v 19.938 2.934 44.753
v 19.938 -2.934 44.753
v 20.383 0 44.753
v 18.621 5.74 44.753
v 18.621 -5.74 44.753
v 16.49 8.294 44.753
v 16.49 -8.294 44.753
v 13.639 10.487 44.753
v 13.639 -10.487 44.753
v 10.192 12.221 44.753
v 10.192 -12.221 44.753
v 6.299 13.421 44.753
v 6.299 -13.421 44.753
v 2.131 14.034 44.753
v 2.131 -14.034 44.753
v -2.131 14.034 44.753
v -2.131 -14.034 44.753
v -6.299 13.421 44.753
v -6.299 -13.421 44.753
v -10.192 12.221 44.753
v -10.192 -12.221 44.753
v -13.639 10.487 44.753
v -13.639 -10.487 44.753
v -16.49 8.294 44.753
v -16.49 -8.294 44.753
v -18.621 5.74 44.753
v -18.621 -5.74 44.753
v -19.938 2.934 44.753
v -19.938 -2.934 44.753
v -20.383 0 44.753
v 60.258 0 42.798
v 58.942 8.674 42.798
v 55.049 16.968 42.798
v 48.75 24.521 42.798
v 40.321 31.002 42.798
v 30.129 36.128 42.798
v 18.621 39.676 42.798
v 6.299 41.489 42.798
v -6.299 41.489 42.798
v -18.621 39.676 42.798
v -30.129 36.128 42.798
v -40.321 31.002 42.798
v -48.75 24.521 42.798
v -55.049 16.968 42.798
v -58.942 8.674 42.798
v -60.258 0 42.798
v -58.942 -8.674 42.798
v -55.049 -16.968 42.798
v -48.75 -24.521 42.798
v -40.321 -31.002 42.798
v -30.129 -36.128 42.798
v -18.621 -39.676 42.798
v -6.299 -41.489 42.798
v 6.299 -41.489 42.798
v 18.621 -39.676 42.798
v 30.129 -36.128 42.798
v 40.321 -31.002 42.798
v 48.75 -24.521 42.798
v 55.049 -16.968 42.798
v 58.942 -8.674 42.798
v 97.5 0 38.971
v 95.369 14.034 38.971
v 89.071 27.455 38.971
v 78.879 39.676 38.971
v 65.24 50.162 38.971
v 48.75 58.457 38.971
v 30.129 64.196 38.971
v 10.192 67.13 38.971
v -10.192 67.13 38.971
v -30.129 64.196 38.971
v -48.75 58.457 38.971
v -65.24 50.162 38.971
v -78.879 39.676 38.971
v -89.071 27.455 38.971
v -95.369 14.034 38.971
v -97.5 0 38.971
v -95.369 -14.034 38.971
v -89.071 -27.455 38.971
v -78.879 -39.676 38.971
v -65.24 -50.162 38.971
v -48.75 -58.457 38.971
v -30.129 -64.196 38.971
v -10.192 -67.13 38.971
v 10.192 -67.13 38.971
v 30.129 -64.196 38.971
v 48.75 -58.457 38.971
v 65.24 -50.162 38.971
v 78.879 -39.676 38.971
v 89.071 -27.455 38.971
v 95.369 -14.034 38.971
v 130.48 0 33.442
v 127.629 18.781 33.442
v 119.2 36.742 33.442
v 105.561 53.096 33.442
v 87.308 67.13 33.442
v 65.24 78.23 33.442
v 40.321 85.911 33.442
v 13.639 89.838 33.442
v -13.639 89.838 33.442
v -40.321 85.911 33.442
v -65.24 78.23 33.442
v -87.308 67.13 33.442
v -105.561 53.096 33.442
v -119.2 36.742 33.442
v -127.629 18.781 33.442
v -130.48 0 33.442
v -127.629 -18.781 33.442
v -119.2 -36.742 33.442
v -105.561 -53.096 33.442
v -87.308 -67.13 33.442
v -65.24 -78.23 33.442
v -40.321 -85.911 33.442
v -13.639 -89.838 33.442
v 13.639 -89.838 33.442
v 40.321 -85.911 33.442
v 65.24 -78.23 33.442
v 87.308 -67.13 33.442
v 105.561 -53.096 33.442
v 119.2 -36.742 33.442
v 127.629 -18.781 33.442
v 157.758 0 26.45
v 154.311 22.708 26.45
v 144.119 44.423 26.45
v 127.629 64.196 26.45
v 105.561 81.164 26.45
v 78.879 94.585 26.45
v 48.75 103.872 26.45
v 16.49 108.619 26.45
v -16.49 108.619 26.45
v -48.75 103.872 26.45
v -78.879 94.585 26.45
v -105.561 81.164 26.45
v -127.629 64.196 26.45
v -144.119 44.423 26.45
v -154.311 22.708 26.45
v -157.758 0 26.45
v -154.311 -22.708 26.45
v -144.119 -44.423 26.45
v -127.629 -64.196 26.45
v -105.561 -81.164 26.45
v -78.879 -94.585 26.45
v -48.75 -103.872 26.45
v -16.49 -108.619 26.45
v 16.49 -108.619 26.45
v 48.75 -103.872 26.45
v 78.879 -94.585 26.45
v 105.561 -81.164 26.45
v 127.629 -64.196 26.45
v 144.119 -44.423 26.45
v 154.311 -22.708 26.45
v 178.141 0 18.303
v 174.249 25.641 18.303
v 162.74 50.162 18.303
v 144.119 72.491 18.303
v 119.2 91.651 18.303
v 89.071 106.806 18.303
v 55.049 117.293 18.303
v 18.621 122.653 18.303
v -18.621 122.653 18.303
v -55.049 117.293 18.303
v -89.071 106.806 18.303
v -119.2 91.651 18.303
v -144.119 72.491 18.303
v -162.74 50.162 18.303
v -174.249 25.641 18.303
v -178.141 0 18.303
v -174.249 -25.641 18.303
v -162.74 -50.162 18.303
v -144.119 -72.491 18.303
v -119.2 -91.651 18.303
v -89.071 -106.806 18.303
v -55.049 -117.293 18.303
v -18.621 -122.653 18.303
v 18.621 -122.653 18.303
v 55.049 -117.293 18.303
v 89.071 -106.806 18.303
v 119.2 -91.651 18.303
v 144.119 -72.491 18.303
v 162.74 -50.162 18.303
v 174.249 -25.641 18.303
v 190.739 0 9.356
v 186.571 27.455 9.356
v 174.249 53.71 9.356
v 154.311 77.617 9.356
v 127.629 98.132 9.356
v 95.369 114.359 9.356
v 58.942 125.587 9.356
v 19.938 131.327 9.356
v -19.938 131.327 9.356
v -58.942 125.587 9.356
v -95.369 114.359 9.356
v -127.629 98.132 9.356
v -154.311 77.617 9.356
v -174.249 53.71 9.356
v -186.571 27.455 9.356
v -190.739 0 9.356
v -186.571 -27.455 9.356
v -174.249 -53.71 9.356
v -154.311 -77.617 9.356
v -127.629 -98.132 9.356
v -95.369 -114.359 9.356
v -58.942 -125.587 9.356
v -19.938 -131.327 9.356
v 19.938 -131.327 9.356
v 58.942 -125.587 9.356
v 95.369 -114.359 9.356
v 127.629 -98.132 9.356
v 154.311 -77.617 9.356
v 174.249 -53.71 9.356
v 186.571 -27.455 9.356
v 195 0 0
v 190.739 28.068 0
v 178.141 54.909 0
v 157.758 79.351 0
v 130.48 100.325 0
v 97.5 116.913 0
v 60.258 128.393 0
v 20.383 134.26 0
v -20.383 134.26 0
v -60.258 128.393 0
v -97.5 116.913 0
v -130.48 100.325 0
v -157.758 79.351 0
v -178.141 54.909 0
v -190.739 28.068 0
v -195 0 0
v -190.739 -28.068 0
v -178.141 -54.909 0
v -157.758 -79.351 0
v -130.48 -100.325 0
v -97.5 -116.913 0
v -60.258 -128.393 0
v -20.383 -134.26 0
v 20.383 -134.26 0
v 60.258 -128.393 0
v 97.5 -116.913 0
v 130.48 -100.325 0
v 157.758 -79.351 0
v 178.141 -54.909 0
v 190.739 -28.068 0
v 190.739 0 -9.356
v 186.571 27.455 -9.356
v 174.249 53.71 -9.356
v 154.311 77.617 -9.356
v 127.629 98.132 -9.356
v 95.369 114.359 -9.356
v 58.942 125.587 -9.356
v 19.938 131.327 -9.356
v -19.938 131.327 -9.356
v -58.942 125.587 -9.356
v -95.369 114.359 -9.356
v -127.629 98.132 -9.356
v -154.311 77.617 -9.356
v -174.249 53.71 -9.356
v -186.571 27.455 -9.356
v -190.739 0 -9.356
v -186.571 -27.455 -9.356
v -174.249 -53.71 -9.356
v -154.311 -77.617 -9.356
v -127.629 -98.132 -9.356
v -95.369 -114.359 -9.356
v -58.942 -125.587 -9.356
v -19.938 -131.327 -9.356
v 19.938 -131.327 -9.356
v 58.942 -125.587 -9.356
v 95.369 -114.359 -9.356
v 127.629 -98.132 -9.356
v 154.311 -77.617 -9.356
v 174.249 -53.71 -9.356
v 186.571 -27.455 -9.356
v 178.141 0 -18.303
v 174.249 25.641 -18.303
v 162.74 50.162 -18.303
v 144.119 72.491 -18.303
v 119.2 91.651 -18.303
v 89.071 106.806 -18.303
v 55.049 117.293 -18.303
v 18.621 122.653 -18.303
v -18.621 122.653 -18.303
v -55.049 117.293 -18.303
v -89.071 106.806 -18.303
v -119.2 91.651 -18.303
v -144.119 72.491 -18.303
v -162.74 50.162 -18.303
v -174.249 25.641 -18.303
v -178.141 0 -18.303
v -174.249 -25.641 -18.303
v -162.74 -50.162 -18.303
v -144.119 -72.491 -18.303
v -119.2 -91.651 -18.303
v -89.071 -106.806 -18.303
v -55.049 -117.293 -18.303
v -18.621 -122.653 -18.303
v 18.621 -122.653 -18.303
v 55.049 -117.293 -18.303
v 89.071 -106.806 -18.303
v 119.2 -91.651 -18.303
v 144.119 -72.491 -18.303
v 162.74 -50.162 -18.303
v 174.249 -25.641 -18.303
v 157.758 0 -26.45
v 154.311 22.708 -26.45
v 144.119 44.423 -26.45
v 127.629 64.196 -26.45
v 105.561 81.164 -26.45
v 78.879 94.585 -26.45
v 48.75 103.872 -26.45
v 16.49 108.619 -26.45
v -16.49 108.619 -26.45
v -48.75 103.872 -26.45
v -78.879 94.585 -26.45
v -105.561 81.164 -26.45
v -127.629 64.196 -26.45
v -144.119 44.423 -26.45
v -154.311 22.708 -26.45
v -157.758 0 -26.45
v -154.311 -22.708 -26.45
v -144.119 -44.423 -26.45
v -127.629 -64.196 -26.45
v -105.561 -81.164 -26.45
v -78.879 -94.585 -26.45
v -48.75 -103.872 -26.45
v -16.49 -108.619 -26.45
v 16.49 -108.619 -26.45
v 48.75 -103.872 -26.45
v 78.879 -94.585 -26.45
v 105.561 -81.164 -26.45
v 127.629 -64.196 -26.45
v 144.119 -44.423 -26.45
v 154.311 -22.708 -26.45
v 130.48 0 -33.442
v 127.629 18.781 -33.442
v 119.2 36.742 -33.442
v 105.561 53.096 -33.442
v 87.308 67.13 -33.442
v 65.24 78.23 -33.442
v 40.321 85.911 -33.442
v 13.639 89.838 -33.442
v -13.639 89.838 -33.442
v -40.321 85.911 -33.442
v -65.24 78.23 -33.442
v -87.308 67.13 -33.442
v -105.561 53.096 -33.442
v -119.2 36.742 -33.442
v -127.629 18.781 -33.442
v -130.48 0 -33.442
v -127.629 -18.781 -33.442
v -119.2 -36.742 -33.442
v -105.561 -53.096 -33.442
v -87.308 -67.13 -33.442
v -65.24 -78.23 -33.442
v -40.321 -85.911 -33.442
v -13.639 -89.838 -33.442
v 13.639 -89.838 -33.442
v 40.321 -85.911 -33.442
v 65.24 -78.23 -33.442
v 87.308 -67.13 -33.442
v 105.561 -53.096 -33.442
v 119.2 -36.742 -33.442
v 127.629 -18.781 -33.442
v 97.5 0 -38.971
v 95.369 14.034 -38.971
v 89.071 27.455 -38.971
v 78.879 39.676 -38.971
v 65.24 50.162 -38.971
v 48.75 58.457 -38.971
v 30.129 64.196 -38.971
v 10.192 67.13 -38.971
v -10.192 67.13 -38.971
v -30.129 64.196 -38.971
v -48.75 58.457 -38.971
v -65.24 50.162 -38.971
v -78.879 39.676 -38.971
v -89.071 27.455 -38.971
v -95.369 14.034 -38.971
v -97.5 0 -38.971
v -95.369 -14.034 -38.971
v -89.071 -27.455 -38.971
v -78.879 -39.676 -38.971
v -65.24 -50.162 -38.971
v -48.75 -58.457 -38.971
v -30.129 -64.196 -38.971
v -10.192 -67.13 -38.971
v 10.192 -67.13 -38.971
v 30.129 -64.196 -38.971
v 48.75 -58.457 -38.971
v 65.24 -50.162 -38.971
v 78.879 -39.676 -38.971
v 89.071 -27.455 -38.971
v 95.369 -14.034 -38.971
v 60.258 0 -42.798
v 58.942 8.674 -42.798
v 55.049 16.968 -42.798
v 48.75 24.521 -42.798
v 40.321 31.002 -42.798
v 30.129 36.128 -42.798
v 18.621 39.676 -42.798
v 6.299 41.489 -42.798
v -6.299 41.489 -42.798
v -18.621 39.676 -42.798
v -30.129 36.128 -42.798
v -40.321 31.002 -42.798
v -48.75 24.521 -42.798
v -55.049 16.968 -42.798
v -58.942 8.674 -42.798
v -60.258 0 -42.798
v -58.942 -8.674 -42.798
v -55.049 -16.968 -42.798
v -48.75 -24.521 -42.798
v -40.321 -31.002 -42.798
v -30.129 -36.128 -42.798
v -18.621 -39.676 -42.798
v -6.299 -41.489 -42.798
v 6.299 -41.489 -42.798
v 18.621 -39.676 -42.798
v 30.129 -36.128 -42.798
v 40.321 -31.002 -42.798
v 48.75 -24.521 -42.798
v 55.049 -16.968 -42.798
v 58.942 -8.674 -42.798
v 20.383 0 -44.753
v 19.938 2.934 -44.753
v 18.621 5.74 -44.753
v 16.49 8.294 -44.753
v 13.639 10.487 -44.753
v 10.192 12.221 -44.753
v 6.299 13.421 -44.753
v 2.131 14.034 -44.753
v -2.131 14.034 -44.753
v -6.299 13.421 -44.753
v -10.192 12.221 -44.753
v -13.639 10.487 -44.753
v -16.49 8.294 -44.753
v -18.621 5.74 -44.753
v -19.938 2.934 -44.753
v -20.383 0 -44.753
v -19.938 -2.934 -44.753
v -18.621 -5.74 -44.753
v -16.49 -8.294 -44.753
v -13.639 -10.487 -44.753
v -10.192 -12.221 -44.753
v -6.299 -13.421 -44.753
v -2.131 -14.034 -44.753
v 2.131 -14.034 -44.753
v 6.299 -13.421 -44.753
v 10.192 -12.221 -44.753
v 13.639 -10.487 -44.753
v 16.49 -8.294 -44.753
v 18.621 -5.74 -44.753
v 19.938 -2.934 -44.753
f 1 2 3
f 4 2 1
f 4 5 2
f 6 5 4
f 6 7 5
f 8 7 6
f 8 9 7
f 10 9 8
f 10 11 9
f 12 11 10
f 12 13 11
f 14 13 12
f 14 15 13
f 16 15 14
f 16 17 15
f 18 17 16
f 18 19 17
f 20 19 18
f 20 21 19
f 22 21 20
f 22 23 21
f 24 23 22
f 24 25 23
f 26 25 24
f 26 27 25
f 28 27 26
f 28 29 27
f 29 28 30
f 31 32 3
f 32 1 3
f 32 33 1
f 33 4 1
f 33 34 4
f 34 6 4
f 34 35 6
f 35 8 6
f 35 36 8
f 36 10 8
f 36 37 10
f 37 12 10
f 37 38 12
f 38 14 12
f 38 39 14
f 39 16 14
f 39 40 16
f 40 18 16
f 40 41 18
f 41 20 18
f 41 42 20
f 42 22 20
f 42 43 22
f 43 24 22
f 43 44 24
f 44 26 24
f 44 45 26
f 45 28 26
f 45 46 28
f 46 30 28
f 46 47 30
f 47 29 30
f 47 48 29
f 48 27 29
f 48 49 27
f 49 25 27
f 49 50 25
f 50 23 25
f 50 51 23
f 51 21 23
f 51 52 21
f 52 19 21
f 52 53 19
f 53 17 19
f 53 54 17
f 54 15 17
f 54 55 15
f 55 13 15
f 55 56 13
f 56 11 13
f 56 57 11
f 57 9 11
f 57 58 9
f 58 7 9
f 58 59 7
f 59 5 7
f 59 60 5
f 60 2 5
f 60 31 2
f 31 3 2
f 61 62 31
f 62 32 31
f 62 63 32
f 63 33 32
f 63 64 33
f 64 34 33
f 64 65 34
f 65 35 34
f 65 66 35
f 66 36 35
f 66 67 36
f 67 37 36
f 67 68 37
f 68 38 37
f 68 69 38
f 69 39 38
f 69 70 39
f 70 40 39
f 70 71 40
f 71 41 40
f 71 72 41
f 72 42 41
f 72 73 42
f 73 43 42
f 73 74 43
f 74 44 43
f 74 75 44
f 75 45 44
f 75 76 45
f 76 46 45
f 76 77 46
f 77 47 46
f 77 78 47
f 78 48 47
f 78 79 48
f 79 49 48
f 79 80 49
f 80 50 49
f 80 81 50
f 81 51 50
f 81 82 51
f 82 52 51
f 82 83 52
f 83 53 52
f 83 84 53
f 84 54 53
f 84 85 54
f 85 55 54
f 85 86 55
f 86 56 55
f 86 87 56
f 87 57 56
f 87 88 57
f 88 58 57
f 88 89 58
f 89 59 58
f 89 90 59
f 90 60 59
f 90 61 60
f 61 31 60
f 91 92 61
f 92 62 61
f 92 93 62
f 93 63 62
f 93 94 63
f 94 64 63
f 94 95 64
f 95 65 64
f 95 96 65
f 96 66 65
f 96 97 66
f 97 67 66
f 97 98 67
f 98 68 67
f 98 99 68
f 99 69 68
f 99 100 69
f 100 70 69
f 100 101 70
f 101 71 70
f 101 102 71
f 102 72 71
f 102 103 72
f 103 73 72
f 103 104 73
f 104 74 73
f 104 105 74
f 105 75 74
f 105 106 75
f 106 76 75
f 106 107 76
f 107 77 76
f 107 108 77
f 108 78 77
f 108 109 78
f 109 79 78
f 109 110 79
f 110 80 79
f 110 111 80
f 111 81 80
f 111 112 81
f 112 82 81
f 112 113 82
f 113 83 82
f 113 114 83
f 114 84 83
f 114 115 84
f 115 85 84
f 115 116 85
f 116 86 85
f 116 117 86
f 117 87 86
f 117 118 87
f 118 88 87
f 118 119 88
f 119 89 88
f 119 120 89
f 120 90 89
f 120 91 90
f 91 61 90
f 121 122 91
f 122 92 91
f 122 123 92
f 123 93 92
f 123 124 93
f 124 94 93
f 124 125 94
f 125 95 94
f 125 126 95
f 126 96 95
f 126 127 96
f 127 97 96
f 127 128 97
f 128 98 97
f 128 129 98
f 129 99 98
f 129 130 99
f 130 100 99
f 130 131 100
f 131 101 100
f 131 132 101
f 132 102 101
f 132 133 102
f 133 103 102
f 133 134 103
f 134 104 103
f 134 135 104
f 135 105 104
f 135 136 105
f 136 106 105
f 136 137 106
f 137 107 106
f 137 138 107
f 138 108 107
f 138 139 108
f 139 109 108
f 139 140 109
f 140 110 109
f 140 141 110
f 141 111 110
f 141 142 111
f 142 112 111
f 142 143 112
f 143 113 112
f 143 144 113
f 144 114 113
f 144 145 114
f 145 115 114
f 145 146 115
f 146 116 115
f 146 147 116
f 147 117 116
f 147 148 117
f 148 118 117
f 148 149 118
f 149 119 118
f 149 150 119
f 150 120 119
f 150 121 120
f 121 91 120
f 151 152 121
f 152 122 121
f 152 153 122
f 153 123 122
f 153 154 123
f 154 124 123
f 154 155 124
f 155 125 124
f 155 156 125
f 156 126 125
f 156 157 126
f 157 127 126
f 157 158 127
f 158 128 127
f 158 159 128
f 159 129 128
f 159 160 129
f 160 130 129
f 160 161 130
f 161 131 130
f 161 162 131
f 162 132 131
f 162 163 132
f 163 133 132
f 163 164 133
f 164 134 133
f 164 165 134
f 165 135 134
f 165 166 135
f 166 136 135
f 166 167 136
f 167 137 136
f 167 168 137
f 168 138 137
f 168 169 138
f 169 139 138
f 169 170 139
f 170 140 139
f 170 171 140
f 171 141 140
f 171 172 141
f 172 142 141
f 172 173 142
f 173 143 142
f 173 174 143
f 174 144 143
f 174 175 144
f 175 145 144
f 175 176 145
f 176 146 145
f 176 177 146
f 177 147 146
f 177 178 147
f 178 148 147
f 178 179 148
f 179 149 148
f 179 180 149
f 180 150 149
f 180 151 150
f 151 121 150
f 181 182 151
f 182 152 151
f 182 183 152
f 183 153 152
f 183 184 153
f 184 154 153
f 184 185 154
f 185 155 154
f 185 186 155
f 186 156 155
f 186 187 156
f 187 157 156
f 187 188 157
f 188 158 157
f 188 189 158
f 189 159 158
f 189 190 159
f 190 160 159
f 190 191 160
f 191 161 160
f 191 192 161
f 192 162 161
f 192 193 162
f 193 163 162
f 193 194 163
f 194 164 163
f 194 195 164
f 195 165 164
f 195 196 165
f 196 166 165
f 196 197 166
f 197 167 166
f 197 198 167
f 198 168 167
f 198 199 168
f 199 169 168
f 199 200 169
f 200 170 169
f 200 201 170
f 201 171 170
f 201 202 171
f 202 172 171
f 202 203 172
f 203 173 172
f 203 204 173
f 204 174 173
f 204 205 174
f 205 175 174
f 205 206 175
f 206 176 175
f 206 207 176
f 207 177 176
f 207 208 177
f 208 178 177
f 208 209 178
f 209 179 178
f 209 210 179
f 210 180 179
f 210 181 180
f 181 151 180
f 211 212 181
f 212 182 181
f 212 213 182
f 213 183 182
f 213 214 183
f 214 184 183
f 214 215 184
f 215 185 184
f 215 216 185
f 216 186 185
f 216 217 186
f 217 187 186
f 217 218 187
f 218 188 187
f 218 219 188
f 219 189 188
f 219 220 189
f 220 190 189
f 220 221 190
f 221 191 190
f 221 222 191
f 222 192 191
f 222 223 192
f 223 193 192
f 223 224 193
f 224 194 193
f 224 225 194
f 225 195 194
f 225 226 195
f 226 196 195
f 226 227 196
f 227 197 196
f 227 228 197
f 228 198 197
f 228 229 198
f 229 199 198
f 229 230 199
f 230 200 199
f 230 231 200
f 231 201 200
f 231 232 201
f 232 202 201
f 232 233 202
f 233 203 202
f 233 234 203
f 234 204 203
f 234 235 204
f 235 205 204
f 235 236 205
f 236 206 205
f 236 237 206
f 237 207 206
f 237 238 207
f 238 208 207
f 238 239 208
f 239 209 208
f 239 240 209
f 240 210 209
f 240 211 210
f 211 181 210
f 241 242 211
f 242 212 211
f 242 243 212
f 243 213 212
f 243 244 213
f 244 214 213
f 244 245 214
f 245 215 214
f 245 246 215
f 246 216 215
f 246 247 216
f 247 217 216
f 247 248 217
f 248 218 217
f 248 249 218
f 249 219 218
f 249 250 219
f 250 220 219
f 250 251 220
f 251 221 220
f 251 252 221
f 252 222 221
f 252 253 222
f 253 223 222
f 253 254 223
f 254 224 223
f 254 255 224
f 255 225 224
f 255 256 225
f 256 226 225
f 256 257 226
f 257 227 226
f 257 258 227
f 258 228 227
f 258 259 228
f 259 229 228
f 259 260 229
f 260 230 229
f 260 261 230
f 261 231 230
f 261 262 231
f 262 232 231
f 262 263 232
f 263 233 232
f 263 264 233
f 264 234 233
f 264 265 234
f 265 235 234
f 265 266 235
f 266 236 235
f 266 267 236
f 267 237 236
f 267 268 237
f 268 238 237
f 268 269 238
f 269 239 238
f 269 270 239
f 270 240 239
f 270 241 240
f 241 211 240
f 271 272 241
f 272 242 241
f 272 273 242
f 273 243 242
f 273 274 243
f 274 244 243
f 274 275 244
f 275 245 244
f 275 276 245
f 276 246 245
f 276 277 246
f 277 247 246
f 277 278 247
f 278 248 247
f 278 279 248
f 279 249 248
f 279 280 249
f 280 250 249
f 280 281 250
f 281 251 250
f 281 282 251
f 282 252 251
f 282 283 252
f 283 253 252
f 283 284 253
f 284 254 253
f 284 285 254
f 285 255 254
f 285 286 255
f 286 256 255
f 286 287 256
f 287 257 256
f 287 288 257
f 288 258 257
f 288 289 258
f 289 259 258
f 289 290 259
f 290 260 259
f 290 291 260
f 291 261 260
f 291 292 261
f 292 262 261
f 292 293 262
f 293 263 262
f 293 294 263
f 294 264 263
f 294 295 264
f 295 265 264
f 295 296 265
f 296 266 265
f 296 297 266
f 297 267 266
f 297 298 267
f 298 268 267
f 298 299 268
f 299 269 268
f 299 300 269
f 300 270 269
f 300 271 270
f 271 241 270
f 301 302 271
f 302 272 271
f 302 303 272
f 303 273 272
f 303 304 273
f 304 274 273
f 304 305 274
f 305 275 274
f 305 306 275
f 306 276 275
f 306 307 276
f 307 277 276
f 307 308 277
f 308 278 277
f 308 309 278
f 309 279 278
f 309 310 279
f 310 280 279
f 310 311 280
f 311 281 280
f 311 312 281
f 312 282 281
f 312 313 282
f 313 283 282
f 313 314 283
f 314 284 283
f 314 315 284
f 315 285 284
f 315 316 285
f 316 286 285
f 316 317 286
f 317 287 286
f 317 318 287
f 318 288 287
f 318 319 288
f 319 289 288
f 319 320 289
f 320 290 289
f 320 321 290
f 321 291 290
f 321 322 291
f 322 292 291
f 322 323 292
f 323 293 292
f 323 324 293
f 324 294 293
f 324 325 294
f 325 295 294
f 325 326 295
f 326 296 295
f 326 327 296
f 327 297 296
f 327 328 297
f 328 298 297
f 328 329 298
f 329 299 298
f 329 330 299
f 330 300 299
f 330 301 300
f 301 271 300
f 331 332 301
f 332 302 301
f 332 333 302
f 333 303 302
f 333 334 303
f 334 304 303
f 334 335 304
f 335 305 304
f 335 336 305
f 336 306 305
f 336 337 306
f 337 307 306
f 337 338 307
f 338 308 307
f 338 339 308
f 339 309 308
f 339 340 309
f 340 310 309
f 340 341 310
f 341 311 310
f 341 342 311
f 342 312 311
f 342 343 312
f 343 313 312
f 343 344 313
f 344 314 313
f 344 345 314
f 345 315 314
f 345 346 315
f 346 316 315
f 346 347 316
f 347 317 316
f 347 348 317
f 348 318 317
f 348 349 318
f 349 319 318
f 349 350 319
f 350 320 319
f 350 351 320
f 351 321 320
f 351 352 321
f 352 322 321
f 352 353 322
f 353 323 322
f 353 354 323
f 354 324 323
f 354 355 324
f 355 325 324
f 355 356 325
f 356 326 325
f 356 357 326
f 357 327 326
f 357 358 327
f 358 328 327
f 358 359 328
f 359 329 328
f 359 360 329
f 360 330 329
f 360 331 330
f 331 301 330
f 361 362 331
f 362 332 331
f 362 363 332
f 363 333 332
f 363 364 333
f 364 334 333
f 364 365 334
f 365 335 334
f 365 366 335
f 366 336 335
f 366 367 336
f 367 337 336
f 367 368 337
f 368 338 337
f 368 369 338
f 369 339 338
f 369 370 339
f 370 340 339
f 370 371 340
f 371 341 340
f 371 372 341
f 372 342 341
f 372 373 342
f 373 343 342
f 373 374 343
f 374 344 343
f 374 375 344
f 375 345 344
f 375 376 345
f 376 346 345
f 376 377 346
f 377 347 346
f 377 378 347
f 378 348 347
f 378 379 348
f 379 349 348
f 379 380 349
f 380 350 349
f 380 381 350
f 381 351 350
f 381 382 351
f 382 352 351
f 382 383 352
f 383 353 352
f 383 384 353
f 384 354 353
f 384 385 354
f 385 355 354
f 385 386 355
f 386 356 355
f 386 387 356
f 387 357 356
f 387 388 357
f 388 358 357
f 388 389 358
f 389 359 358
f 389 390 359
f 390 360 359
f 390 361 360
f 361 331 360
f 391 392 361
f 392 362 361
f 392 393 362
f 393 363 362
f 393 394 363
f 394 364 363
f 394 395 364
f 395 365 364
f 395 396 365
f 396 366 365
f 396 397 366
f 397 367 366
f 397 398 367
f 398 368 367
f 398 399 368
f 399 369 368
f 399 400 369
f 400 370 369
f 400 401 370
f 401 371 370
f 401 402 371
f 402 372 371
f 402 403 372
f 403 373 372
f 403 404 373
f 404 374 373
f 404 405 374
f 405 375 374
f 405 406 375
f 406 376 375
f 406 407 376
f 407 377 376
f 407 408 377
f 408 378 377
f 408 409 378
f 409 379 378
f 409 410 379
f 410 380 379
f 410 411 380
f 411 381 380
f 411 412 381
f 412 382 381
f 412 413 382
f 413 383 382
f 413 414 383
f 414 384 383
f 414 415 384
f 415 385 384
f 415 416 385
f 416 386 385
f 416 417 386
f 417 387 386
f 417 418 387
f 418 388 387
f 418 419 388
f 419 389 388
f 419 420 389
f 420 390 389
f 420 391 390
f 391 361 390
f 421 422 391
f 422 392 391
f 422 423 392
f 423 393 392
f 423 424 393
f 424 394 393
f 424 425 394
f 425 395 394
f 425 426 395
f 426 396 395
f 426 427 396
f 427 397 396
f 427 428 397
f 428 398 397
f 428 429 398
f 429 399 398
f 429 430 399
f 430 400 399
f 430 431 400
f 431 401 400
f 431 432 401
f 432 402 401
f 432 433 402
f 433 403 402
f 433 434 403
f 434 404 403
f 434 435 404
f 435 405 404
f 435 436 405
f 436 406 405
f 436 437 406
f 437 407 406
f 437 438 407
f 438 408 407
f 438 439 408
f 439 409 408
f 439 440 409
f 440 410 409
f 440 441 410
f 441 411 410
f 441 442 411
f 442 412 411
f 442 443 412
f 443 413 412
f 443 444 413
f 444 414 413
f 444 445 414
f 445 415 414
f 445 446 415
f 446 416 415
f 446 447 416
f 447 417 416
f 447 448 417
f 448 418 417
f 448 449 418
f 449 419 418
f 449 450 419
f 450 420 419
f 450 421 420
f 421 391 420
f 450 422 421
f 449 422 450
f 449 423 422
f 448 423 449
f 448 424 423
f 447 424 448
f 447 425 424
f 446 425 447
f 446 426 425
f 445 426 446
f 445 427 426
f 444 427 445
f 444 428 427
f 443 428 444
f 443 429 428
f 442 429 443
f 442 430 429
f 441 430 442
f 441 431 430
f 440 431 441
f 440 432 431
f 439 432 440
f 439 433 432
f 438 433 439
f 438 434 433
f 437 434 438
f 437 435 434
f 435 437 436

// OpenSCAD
// Generated by SolidPython 1.0.1 on 2020-07-29 00:46:50


scale(v = [13, 9, 3]) {
	sphere(r = 15);
}
/***********************************************
*********      SolidPython code:      **********
************************************************
 
# import packages: SolidPython
from solid import *
from solid.utils import *
from itertools import chain, combinations, permutations


class Resize:

    def __init__(self, scad_file):
        self.scad_file = scad_file
        #self.scad_file = import_scad(scad_file)
        # cone/cylinder param:
        self.r1 = 0
        self.r2 = 0
        self.h = 0
        # rectangular prism param:
        self.w = 0
        self.l = 0
        # ellipse param:
        self.r = 0

    # import OpenScad code (file name corresponds to shape)


    # classify shape + parameters
    def assign(self, param1, param2, param3):
        if self.scad_file == 'cone.scad':
            self.r1 = param1
            self.r2 = param2
            self.h = param3
        elif self.scad_file == 'cylinder.scad':
            self.r1 = param1
            self.r2 = param2
            self.h = param3
        elif self.scad_file == 'rectangularPrism.scad':
            self.h = param1
            self.l = param2
            self.w = param3
        else:
            self.r = param1
            self.h = param2

    # resize parameters
    def iterate(self):
        x = range(3, 20, 2)
        i = 1
        if self.scad_file == 'cone.scad':
            tempList = list(permutations(x, 2))
            for temp in tempList:
                param1 = temp[0]
                param2 = temp[1]
                filepath = 'produced_scad_files/' + 'cone' + str(param1) + '_' + str(param2) + '_' + '.scad'
                scad_render_to_file(cylinder(h=param1, r1=param2, r2=0), filepath)

        elif self.scad_file == 'cylinder.scad':
            tempList = list(permutations(x, 3))
            for temp in tempList:
                param1 = temp[0]
                param2 = temp[1]
                filepath = 'produced_scad_files/' + 'cylinder' + str(param1) + '_' + str(param2) + '_' + '.scad'
                scad_render_to_file(cylinder(h=param1, r1=param2, r2=param2), filepath)

        elif self.scad_file == 'rectangularPrism.scad':
            tempList = list(permutations(x, 3))
            for temp in tempList:
                param1 = temp[0]
                param2 = temp[1]
                param3 = temp[2]
                filepath = 'produced_scad_files/' + 'rectangularPrism' + str(param1) + '_' + str(param2) + '_' + str(
                    param3) + '.scad'
                scad_render_to_file(cube(size=(param1, param2, param3)), filepath)

        elif self.scad_file == 'ellipse.scad':
            tempList = list(permutations(x, 4))
            for temp in tempList:
                param1 = temp[0]
                param2 = temp[1]
                param3 = temp[2]
                param4 = temp[3]
                filepath = 'produced_scad_files/' + 'ellipse' + str(param1) + '_' + str(param2) + '_' + str(param3) + '_' + str(param4) + '.scad'
                scad_render_to_file(scale([param1, param2, param3])(sphere(r=param4)), filepath)

    def render_to_scadfile(self):
        scad_render_to_file(scad, 'example.scad') 
 
************************************************/
